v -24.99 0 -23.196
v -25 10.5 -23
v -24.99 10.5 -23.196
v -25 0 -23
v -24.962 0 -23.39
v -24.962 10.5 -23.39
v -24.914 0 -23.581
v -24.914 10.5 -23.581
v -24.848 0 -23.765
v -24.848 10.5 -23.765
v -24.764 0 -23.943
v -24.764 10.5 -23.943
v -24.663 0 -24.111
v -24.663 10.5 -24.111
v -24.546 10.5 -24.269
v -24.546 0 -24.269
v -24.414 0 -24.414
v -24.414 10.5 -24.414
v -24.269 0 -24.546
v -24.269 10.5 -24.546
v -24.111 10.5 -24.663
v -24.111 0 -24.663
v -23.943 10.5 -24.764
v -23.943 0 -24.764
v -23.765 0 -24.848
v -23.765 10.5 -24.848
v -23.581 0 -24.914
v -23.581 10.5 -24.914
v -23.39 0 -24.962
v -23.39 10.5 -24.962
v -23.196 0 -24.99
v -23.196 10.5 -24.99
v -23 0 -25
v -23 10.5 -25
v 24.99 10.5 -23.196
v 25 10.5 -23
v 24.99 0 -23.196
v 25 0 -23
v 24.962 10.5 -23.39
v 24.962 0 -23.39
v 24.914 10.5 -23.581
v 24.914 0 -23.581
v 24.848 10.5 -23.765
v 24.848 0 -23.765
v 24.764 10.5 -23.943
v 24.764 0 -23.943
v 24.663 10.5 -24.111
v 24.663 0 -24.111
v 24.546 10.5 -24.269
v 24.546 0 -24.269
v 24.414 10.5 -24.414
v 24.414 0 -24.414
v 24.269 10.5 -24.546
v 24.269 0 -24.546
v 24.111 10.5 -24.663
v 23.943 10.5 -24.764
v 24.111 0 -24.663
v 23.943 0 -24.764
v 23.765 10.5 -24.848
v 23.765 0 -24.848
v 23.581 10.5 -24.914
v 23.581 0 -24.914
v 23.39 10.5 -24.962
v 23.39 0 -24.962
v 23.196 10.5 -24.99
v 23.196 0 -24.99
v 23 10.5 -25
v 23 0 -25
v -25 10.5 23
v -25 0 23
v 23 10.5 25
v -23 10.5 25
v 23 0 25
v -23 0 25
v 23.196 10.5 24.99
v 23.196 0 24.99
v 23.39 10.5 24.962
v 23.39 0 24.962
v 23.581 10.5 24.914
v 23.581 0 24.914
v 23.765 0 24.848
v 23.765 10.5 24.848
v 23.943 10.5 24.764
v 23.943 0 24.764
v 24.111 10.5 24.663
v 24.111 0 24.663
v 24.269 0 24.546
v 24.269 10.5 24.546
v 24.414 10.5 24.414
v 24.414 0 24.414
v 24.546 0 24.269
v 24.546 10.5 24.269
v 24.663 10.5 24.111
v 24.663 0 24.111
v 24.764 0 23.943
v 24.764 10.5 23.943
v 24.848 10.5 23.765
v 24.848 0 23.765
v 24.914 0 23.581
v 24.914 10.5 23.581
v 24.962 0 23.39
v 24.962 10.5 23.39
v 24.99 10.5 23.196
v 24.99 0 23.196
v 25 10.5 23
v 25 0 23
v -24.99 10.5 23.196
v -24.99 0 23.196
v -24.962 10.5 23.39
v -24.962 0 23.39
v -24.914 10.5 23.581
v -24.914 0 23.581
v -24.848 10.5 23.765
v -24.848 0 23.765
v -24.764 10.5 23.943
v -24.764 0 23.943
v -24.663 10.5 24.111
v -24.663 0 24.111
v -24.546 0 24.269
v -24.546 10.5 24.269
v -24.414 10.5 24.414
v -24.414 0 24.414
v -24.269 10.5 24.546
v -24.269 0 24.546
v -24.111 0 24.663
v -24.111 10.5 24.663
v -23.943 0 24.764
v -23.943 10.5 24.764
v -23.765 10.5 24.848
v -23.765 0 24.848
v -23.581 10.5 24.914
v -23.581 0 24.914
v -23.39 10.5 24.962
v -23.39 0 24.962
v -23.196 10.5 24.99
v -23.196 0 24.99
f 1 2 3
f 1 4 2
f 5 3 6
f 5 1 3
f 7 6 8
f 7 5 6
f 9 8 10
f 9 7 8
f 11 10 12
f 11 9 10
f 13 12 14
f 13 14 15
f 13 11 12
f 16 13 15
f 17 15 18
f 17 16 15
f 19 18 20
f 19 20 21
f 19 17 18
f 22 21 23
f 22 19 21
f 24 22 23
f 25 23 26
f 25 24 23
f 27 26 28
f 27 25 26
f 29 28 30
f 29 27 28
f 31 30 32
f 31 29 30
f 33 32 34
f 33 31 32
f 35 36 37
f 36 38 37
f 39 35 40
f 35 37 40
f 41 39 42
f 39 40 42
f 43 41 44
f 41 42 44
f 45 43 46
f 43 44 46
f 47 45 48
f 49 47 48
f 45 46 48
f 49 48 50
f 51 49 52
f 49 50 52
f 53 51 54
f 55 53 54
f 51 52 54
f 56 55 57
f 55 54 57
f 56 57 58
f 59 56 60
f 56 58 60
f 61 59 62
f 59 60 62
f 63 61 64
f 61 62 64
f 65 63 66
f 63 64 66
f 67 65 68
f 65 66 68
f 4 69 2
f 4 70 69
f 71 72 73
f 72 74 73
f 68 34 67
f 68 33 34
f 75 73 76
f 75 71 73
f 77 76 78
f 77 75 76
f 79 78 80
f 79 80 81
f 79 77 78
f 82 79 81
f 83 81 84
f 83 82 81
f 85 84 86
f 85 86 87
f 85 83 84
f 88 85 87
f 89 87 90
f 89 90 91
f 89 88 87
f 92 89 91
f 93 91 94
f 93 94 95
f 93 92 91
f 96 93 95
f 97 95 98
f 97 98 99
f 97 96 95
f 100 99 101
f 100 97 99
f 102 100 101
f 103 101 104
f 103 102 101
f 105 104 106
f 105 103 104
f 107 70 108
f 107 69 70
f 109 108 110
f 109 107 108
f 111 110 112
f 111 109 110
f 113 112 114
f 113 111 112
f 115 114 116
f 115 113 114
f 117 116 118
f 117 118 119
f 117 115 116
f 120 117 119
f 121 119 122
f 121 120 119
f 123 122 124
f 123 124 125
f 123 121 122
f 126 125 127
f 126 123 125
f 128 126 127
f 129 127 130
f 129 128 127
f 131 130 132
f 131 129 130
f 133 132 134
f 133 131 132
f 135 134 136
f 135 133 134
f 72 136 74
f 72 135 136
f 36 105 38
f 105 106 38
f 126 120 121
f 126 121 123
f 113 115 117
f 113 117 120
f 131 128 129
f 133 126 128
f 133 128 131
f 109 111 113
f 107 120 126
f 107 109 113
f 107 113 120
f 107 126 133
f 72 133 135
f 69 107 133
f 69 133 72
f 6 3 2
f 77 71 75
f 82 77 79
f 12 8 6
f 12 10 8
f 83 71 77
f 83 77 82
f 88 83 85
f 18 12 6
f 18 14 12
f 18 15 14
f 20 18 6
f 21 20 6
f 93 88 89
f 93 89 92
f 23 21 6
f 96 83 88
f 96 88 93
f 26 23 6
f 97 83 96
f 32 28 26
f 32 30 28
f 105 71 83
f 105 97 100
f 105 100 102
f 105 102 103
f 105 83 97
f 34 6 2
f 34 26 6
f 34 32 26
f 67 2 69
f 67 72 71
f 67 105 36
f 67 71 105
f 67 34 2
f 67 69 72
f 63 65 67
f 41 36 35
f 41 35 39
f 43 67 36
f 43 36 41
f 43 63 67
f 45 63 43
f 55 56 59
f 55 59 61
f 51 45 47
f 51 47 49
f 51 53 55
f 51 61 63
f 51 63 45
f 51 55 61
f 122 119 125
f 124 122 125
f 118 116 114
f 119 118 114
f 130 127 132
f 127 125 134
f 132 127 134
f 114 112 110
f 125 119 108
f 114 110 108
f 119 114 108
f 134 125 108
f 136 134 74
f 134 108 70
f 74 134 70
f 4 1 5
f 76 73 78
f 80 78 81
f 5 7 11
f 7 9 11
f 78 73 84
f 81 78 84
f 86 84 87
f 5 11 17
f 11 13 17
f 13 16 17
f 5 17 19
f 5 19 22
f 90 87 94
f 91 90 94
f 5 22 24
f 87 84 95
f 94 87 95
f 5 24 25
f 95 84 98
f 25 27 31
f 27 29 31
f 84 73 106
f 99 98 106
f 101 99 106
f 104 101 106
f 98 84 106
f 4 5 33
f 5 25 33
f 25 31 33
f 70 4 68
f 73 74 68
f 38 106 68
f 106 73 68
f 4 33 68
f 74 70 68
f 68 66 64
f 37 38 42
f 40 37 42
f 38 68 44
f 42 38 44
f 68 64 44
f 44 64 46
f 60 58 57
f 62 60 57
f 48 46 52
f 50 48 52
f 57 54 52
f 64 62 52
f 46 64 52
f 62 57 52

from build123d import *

# Parameters (mm, degrees)
SKETCH_1_W      = 50
SKETCH_1_H      = 50
EXTRUDE_1_DEPTH = 10
SKETCH_2_W      = 50
SKETCH_2_H      = 50
EXTRUDE_2_DEPTH = 0.5
FILLET_1_R      = 2


with BuildPart() as part:
    # 草图1 → 凸台-拉伸1 (new body)
    with BuildSketch(Plane(origin=(0, 0, 0), x_dir=(1, 0, 0), z_dir=(0, 1, 0))):
        Rectangle(SKETCH_1_W, SKETCH_1_H)
    extrude(amount=EXTRUDE_1_DEPTH)

    # 草图2 → 凸台-拉伸2 (add)
    with BuildSketch(Plane(origin=(0, 10, 0), x_dir=(1, 0, 0), z_dir=(0, 1, 0))):
        Rectangle(SKETCH_2_W, SKETCH_2_H)
    extrude(amount=EXTRUDE_2_DEPTH)

    # 圆角1
    fillet_1_edges = [part.edges().sort_by_distance(p)[0] for p in [
        (25, 5.25, 25),
        (-25, 5.25, 25),
        (-25, 5.25, -25),
        (25, 5.25, -25),
    ]]
    fillet(fillet_1_edges, radius=FILLET_1_R)


solid = part.part
